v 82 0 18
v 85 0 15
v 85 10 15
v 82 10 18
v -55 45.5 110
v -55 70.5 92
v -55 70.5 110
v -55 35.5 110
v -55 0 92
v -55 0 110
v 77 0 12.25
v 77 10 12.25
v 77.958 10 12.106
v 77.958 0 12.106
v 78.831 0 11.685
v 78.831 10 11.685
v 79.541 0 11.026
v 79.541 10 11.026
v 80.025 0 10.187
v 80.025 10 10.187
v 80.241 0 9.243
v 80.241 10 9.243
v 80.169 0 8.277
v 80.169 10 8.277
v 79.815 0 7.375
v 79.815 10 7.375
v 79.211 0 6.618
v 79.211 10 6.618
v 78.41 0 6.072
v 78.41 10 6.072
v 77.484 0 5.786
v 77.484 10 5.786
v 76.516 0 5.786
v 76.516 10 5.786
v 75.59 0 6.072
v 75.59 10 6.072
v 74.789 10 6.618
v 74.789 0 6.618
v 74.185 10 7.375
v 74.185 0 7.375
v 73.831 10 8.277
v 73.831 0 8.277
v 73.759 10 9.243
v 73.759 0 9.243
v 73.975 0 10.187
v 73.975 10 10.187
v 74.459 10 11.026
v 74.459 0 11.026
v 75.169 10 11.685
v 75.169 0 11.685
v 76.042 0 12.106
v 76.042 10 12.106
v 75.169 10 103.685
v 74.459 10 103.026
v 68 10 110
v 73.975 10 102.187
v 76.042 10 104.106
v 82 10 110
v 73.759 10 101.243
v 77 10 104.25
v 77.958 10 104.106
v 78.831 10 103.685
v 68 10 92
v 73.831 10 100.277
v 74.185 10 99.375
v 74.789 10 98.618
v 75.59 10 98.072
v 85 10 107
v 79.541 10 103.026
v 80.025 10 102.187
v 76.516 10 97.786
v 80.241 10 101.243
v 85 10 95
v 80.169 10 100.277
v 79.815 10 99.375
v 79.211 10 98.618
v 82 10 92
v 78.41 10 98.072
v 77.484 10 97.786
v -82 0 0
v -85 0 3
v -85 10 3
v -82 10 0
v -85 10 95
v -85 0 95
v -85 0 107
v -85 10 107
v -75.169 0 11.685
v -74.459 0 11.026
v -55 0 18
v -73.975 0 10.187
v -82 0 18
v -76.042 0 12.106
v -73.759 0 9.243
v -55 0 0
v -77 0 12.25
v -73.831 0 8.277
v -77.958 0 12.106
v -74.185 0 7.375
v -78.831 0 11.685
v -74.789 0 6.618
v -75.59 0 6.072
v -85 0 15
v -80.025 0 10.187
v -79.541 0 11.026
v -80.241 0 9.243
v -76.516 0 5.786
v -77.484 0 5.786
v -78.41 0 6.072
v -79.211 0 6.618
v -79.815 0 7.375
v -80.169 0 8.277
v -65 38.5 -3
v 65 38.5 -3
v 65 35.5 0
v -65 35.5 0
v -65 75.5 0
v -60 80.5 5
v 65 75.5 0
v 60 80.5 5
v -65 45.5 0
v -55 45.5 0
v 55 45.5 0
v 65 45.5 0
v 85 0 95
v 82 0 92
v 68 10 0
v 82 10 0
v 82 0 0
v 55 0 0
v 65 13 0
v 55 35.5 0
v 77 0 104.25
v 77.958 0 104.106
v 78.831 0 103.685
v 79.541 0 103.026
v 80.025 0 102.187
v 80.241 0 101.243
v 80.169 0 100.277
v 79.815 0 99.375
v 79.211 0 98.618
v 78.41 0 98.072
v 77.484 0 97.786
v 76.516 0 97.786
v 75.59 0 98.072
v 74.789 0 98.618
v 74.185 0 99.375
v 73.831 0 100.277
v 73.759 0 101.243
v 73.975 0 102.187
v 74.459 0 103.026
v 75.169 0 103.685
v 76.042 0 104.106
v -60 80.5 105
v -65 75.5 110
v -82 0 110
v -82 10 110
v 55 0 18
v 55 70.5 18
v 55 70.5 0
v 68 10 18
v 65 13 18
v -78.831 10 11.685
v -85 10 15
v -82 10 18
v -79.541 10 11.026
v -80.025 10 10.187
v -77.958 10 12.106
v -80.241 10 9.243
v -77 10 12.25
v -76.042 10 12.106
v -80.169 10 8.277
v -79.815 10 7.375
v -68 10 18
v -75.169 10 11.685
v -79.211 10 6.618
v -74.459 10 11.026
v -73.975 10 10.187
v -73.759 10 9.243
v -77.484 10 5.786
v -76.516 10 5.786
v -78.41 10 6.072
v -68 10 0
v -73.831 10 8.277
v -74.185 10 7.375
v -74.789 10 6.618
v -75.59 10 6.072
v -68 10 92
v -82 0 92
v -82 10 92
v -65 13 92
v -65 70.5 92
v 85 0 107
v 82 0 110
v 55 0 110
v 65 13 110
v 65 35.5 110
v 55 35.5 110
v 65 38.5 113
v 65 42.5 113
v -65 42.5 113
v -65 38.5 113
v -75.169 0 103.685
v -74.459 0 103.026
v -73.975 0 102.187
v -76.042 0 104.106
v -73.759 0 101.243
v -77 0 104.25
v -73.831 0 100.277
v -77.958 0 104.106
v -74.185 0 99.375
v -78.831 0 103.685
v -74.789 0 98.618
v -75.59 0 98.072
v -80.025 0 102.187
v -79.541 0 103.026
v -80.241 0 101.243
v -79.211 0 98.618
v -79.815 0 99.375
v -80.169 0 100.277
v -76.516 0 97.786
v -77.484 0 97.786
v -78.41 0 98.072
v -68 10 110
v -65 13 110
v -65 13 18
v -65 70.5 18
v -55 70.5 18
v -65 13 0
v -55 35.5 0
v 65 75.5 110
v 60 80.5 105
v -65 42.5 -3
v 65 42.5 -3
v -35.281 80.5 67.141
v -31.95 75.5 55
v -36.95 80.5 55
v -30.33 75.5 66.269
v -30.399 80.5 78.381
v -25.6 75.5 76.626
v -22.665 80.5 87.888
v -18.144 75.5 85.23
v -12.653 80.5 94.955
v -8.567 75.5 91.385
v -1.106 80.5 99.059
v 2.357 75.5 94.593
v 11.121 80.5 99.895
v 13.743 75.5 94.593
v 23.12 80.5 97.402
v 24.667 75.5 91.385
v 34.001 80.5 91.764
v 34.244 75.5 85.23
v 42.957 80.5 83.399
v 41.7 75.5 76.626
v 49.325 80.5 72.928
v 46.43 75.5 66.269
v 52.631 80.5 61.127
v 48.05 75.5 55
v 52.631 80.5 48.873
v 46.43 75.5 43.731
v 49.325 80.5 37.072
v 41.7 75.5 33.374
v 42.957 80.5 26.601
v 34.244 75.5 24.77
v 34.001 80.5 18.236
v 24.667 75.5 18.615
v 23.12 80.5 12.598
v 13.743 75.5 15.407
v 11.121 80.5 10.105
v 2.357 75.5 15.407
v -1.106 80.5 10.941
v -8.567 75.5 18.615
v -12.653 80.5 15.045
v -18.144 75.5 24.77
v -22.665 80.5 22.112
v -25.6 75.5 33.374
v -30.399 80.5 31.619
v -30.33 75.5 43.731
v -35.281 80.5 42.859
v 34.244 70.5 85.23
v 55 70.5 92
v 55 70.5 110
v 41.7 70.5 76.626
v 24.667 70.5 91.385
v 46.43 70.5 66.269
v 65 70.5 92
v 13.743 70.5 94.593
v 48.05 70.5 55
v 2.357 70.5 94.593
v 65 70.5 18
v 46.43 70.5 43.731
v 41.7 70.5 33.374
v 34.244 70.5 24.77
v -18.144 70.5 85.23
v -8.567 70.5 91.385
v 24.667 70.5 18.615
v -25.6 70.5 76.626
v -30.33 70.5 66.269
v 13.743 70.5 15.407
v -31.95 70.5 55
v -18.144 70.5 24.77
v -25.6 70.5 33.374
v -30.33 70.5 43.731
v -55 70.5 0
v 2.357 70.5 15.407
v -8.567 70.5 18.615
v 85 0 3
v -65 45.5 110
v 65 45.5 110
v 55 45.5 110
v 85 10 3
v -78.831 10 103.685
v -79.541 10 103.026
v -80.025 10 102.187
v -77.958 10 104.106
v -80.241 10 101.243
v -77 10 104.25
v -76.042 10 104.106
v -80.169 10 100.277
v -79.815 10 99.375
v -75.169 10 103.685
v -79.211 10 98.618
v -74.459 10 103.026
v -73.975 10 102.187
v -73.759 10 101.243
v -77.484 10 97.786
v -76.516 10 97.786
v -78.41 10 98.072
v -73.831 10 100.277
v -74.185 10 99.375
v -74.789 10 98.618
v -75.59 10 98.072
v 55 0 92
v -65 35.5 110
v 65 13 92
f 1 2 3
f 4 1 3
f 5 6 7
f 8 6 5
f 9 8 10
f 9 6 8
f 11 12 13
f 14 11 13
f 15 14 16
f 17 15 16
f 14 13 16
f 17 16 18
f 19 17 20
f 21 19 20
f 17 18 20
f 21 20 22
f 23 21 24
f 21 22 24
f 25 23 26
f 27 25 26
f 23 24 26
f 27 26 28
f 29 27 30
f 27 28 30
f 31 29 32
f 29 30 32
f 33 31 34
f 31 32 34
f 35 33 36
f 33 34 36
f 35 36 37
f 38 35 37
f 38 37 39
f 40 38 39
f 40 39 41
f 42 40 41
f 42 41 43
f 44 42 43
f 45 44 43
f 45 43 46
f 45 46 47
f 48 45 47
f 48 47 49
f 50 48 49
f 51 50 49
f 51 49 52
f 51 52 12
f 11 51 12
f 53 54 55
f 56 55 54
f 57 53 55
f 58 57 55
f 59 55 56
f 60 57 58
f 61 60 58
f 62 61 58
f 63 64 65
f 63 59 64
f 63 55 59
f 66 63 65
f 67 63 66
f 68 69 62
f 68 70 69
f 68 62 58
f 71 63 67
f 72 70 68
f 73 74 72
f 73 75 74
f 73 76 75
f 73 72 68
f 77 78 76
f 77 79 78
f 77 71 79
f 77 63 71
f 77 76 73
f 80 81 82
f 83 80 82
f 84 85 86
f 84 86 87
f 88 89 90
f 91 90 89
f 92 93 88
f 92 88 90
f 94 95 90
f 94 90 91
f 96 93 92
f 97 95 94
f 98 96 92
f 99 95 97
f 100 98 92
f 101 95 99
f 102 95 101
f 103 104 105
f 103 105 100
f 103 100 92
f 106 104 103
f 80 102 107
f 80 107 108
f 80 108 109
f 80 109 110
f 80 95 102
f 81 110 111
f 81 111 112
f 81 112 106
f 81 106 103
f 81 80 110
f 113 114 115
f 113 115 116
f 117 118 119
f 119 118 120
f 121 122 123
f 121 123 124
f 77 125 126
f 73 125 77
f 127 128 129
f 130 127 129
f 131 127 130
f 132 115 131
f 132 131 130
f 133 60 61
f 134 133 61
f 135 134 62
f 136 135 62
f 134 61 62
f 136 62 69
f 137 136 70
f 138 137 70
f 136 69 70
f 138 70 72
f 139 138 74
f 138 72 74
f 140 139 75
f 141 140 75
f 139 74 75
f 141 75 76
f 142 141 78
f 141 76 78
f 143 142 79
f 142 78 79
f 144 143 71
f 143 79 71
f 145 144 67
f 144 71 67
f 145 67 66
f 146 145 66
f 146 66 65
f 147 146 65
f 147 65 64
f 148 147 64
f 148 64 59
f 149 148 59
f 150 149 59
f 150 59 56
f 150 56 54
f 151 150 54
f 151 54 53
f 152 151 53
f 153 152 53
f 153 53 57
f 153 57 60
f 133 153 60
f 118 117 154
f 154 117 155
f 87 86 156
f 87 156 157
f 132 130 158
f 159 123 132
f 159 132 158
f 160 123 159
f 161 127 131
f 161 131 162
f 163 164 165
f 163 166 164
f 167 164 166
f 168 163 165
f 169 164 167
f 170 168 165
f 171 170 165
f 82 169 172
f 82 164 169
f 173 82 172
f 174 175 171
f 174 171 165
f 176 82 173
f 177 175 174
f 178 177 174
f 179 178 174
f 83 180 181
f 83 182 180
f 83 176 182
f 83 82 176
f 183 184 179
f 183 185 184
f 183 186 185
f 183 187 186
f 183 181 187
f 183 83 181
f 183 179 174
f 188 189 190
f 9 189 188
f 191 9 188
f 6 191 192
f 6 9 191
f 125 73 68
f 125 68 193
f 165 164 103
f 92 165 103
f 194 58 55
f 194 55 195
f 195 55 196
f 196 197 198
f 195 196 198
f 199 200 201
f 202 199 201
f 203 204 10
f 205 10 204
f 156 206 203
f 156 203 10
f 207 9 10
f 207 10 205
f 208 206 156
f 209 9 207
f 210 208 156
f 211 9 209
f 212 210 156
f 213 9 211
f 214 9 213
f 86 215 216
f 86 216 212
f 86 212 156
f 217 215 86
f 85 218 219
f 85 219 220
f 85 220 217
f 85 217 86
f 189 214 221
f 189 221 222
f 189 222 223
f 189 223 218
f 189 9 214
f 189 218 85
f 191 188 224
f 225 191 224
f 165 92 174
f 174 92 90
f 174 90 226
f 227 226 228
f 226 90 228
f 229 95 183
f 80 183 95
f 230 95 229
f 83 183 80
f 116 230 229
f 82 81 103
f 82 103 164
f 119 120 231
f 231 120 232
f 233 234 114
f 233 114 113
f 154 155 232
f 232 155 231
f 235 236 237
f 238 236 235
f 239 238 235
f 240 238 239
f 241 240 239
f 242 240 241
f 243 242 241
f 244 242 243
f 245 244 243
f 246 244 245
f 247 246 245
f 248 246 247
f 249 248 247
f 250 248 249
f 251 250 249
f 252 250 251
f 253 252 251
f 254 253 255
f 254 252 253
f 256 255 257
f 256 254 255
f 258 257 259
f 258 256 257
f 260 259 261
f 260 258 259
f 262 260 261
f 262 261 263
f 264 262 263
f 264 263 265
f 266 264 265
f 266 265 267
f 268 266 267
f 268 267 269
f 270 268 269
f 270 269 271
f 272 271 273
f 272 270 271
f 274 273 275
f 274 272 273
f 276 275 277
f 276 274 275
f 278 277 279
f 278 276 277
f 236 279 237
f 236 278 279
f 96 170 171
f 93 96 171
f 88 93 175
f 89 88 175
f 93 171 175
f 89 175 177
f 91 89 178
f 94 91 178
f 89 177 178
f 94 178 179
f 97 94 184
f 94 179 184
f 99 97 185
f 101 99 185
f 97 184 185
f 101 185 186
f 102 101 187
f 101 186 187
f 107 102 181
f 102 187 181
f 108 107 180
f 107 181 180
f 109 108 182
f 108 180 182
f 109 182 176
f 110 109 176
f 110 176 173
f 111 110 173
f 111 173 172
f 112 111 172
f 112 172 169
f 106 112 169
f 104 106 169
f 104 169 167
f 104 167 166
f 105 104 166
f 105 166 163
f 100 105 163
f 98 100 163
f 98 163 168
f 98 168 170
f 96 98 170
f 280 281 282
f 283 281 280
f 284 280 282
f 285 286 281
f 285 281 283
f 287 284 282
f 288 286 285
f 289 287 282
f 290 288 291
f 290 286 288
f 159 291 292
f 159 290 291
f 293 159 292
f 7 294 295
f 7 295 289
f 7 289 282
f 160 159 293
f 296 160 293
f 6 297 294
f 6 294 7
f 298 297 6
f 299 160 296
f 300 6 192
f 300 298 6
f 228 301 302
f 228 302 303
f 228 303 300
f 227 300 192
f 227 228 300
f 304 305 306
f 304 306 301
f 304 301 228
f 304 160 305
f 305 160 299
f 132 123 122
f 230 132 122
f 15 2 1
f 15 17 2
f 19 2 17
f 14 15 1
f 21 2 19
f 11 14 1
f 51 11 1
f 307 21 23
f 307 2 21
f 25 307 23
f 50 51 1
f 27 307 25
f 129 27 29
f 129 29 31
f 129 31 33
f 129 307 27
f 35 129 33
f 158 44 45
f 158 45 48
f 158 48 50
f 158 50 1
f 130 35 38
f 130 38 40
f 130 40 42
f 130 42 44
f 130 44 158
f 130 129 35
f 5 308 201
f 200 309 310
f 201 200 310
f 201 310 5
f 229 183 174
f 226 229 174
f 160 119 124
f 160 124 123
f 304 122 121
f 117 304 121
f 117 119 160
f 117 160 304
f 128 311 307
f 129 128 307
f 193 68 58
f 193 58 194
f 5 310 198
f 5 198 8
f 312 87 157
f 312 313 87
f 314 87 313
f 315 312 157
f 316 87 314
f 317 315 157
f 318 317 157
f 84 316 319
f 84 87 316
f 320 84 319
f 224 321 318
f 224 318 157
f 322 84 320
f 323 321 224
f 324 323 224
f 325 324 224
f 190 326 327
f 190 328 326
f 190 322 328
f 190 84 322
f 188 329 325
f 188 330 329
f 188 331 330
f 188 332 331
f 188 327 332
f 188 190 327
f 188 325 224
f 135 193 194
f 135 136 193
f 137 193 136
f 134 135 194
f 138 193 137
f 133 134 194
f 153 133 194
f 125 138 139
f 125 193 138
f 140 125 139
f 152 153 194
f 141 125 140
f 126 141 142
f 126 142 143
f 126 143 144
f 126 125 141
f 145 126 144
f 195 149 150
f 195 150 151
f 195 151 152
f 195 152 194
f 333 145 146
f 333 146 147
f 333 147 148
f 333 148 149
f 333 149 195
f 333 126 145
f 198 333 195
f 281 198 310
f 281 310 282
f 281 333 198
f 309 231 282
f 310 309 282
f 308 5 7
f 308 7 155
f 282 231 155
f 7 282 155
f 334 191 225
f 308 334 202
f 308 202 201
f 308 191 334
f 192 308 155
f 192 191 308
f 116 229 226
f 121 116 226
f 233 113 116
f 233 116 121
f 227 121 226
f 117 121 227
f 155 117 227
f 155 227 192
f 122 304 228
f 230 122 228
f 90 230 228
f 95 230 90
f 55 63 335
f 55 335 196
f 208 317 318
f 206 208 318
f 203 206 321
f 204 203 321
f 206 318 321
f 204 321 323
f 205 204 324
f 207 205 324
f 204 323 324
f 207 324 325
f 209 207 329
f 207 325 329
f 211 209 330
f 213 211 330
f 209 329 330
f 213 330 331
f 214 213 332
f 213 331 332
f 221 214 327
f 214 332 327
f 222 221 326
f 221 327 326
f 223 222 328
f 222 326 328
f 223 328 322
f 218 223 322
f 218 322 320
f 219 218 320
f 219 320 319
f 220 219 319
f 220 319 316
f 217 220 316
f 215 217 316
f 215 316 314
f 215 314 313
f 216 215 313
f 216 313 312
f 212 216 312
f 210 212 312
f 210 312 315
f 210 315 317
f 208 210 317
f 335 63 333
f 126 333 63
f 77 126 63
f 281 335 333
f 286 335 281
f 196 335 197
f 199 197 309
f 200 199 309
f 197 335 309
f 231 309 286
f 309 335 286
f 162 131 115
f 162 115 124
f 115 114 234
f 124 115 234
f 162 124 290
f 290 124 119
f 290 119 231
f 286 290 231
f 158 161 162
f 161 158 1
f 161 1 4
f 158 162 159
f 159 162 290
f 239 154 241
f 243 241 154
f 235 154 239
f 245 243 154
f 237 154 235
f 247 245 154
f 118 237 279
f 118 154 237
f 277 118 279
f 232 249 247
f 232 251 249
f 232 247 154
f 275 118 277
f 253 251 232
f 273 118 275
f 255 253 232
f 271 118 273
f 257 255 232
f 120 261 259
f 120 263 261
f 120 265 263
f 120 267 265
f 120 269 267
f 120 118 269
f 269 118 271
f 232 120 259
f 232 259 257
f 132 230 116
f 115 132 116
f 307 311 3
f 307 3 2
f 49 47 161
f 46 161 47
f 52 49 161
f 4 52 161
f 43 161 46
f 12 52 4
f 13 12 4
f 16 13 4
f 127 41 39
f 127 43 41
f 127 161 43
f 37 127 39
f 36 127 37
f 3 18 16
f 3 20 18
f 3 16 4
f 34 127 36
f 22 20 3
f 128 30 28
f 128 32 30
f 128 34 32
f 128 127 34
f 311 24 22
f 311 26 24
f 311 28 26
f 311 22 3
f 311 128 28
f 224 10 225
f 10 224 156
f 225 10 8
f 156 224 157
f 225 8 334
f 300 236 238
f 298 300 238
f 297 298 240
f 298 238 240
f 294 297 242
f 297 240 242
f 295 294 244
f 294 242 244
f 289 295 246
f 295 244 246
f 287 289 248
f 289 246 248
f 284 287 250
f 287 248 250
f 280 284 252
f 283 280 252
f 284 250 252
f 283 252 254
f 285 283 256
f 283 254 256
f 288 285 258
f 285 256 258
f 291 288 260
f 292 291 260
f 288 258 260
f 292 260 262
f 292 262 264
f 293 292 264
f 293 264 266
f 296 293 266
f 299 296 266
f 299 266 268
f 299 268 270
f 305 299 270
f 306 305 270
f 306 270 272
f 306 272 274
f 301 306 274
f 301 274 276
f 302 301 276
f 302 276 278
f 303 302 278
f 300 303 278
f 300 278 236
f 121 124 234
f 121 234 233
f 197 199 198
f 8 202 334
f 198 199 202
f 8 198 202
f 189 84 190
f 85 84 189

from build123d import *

# Parameters (mm, degrees)
BOSS_EXTRUDE2_DEPTH = 110
SKETCH4_W           = 74
SKETCH4_H           = 70.5
CUT_EXTRUDE2_DEPTH  = 218.899632859
CUT_EXTRUDE3_REACH  = 162.64
SKETCH5_R           = 40
CUT_EXTRUDE4_REACH  = 157.869
SKETCH6_R           = 3.25
SKETCH7_W           = 130
SKETCH7_H           = 10
BOSS_EXTRUDE3_DEPTH = 3
CHAMFER1_SIZE       = 3
CHAMFER2_SIZE       = 5
CHAMFER3_SIZE       = 3
CHAMFER5_SIZE       = 3


# Some blends are built 0.0001 mm under size
with BuildPart() as part:
    # Sketch3 → Boss-Extrude2 (new body)
    with BuildSketch(Plane.XY):
        Polygon((65, 10), (85, 10), (85, 0), (55, 0), (55, 70.5), (-55, 70.5), (-55, 0), (-85, 0), (-85, 10), (-65, 10), (-65, 80.5), (65, 80.5), align=None)
    extrude(amount=BOSS_EXTRUDE2_DEPTH)

    # Sketch4 → Cut-Extrude2 (cut, through all)
    with BuildSketch(Plane(origin=(85, 0, 0), x_dir=(0, 0, -1), z_dir=(1, 0, 0))):
        with Locations((-55, 35.25)):
            Rectangle(SKETCH4_W, SKETCH4_H)
    extrude(amount=-CUT_EXTRUDE2_DEPTH, mode=Mode.SUBTRACT)

    # Sketch5 → Cut-Extrude3 (cut, up to next)
    with BuildSketch(Plane(origin=(0, 80.5, 0), x_dir=(1, 0, 0), z_dir=(0, 1, 0)), mode=Mode.PRIVATE) as cut_extrude3_sk1:
        with Locations(Location((8.05, -55, 0), (0, 0, 180))):
            Circle(SKETCH5_R)
    cut_extrude3_tool1 = extrude(cut_extrude3_sk1.sketch, amount=-CUT_EXTRUDE3_REACH, mode=Mode.PRIVATE) & part.part
    add(cut_extrude3_tool1.solids().sort_by_distance((8.05, 80.5, 55))[0], mode=Mode.SUBTRACT)

    # Sketch6 → Cut-Extrude4 (cut, up to next)
    with BuildSketch(Plane(origin=(0, 10, 0), x_dir=(1, 0, 0), z_dir=(0, 1, 0)), mode=Mode.PRIVATE) as cut_extrude4_sk1:
        with Locations(Location((77, -101, 0), (0, 0, 270))):
            Circle(SKETCH6_R)
    cut_extrude4_tool1 = extrude(cut_extrude4_sk1.sketch, amount=-CUT_EXTRUDE4_REACH, mode=Mode.PRIVATE) & part.part
    # Sketch6 → Cut-Extrude4 (cut, up to next)
    with BuildSketch(Plane(origin=(0, 10, 0), x_dir=(1, 0, 0), z_dir=(0, 1, 0)), mode=Mode.PRIVATE) as cut_extrude4_sk2:
        with Locations(Location((77, -9, 0), (0, 0, 270))):
            Circle(SKETCH6_R)
    cut_extrude4_tool2 = extrude(cut_extrude4_sk2.sketch, amount=-CUT_EXTRUDE4_REACH, mode=Mode.PRIVATE) & part.part
    # Sketch6 → Cut-Extrude4 (cut, up to next)
    with BuildSketch(Plane(origin=(0, 10, 0), x_dir=(1, 0, 0), z_dir=(0, 1, 0)), mode=Mode.PRIVATE) as cut_extrude4_sk3:
        with Locations(Location((-77, -9, 0), (0, 0, 270))):
            Circle(SKETCH6_R)
    cut_extrude4_tool3 = extrude(cut_extrude4_sk3.sketch, amount=-CUT_EXTRUDE4_REACH, mode=Mode.PRIVATE) & part.part
    # Sketch6 → Cut-Extrude4 (cut, up to next)
    with BuildSketch(Plane(origin=(0, 10, 0), x_dir=(1, 0, 0), z_dir=(0, 1, 0)), mode=Mode.PRIVATE) as cut_extrude4_sk4:
        with Locations(Location((-77, -101, 0), (0, 0, 270))):
            Circle(SKETCH6_R)
    cut_extrude4_tool4 = extrude(cut_extrude4_sk4.sketch, amount=-CUT_EXTRUDE4_REACH, mode=Mode.PRIVATE) & part.part
    add(cut_extrude4_tool1.solids().sort_by_distance((77, 10, 101))[0], mode=Mode.SUBTRACT)
    add(cut_extrude4_tool2.solids().sort_by_distance((77, 10, 9))[0], mode=Mode.SUBTRACT)
    add(cut_extrude4_tool3.solids().sort_by_distance((-77, 10, 9))[0], mode=Mode.SUBTRACT)
    add(cut_extrude4_tool4.solids().sort_by_distance((-77, 10, 101))[0], mode=Mode.SUBTRACT)

    # Sketch7 → Boss-Extrude3 (add)
    with BuildSketch(Plane(origin=(0, 0, 0), x_dir=(-1, 0, 0), z_dir=(0, 0, -1))):
        with Locations((0, 40.5)):
            Rectangle(SKETCH7_W, SKETCH7_H)
    boss_extrude3 = extrude(amount=BOSS_EXTRUDE3_DEPTH)

    # Mirror1: Boss-Extrude3 across plane
    add(boss_extrude3.mirror(Plane.XY.offset(55)))

    # Chamfer1
    chamfer1_edges = [part.edges().sort_by_distance(p)[0] for p in [
        (0, 35.5, -3),
        (0, 45.5, -3),
    ]]
    chamfer(chamfer1_edges, length=CHAMFER1_SIZE - 0.0001)  # a hair under: the kernel refuses the full size

    # Chamfer2
    chamfer2_edges = [part.edges().sort_by_distance(p)[0] for p in [
        (0, 80.5, 0),
        (0, 80.5, 110),
        (-65, 80.5, 55),
        (65, 80.5, 55),
        (48.05, 80.5, 55),
    ]]
    chamfer(chamfer2_edges, length=CHAMFER2_SIZE)

    # Chamfer3
    # the kernel refuses this chamfer: 3 mm, written as the material it takes off along each edge
    with BuildSketch(Plane(origin=(-72.715048964, 35.5, 113), x_dir=(0, 0.9996219169112965, 0.02749587661058676), z_dir=(1, 0, 0))) as chamfer3_piece_1:
        Polygon((CHAMFER3_SIZE * 0.999621916911, -CHAMFER3_SIZE * 0.0274958766106), (-CHAMFER3_SIZE * 0.0274958766106, -CHAMFER3_SIZE * 0.999621916911), (0, 0), align=None)
    extrude(amount=145.430097928, mode=Mode.SUBTRACT)
    with BuildSketch(Plane(origin=(72.715048964, 45.5, 113), x_dir=(0, 0.027495876610586768, -0.9996219169112968), z_dir=(-1, 0, 0))) as chamfer3_piece_2:
        Polygon((CHAMFER3_SIZE * 0.999621916911, CHAMFER3_SIZE * 0.0274958766106), (-CHAMFER3_SIZE * 0.0274958766106, CHAMFER3_SIZE * 0.999621916911), (0, 0), align=None)
    extrude(amount=145.430097928, mode=Mode.SUBTRACT)

    # Chamfer5
    chamfer5_edges = [part.edges().sort_by_distance(p)[0] for p in [
        (-85, 5, 0),
        (85, 5, 0),
        (-65, 10, 101),
        (65, 10, 101),
        (-85, 5, 110),
        (-65, 10, 9),
        (65, 10, 9),
        (85, 5, 18),
        (-85, 5, 92),
        (-85, 5, 18),
        (85, 5, 92),
        (85, 5, 110),
    ]]
    chamfer(chamfer5_edges, length=CHAMFER5_SIZE)


solid = part.part
